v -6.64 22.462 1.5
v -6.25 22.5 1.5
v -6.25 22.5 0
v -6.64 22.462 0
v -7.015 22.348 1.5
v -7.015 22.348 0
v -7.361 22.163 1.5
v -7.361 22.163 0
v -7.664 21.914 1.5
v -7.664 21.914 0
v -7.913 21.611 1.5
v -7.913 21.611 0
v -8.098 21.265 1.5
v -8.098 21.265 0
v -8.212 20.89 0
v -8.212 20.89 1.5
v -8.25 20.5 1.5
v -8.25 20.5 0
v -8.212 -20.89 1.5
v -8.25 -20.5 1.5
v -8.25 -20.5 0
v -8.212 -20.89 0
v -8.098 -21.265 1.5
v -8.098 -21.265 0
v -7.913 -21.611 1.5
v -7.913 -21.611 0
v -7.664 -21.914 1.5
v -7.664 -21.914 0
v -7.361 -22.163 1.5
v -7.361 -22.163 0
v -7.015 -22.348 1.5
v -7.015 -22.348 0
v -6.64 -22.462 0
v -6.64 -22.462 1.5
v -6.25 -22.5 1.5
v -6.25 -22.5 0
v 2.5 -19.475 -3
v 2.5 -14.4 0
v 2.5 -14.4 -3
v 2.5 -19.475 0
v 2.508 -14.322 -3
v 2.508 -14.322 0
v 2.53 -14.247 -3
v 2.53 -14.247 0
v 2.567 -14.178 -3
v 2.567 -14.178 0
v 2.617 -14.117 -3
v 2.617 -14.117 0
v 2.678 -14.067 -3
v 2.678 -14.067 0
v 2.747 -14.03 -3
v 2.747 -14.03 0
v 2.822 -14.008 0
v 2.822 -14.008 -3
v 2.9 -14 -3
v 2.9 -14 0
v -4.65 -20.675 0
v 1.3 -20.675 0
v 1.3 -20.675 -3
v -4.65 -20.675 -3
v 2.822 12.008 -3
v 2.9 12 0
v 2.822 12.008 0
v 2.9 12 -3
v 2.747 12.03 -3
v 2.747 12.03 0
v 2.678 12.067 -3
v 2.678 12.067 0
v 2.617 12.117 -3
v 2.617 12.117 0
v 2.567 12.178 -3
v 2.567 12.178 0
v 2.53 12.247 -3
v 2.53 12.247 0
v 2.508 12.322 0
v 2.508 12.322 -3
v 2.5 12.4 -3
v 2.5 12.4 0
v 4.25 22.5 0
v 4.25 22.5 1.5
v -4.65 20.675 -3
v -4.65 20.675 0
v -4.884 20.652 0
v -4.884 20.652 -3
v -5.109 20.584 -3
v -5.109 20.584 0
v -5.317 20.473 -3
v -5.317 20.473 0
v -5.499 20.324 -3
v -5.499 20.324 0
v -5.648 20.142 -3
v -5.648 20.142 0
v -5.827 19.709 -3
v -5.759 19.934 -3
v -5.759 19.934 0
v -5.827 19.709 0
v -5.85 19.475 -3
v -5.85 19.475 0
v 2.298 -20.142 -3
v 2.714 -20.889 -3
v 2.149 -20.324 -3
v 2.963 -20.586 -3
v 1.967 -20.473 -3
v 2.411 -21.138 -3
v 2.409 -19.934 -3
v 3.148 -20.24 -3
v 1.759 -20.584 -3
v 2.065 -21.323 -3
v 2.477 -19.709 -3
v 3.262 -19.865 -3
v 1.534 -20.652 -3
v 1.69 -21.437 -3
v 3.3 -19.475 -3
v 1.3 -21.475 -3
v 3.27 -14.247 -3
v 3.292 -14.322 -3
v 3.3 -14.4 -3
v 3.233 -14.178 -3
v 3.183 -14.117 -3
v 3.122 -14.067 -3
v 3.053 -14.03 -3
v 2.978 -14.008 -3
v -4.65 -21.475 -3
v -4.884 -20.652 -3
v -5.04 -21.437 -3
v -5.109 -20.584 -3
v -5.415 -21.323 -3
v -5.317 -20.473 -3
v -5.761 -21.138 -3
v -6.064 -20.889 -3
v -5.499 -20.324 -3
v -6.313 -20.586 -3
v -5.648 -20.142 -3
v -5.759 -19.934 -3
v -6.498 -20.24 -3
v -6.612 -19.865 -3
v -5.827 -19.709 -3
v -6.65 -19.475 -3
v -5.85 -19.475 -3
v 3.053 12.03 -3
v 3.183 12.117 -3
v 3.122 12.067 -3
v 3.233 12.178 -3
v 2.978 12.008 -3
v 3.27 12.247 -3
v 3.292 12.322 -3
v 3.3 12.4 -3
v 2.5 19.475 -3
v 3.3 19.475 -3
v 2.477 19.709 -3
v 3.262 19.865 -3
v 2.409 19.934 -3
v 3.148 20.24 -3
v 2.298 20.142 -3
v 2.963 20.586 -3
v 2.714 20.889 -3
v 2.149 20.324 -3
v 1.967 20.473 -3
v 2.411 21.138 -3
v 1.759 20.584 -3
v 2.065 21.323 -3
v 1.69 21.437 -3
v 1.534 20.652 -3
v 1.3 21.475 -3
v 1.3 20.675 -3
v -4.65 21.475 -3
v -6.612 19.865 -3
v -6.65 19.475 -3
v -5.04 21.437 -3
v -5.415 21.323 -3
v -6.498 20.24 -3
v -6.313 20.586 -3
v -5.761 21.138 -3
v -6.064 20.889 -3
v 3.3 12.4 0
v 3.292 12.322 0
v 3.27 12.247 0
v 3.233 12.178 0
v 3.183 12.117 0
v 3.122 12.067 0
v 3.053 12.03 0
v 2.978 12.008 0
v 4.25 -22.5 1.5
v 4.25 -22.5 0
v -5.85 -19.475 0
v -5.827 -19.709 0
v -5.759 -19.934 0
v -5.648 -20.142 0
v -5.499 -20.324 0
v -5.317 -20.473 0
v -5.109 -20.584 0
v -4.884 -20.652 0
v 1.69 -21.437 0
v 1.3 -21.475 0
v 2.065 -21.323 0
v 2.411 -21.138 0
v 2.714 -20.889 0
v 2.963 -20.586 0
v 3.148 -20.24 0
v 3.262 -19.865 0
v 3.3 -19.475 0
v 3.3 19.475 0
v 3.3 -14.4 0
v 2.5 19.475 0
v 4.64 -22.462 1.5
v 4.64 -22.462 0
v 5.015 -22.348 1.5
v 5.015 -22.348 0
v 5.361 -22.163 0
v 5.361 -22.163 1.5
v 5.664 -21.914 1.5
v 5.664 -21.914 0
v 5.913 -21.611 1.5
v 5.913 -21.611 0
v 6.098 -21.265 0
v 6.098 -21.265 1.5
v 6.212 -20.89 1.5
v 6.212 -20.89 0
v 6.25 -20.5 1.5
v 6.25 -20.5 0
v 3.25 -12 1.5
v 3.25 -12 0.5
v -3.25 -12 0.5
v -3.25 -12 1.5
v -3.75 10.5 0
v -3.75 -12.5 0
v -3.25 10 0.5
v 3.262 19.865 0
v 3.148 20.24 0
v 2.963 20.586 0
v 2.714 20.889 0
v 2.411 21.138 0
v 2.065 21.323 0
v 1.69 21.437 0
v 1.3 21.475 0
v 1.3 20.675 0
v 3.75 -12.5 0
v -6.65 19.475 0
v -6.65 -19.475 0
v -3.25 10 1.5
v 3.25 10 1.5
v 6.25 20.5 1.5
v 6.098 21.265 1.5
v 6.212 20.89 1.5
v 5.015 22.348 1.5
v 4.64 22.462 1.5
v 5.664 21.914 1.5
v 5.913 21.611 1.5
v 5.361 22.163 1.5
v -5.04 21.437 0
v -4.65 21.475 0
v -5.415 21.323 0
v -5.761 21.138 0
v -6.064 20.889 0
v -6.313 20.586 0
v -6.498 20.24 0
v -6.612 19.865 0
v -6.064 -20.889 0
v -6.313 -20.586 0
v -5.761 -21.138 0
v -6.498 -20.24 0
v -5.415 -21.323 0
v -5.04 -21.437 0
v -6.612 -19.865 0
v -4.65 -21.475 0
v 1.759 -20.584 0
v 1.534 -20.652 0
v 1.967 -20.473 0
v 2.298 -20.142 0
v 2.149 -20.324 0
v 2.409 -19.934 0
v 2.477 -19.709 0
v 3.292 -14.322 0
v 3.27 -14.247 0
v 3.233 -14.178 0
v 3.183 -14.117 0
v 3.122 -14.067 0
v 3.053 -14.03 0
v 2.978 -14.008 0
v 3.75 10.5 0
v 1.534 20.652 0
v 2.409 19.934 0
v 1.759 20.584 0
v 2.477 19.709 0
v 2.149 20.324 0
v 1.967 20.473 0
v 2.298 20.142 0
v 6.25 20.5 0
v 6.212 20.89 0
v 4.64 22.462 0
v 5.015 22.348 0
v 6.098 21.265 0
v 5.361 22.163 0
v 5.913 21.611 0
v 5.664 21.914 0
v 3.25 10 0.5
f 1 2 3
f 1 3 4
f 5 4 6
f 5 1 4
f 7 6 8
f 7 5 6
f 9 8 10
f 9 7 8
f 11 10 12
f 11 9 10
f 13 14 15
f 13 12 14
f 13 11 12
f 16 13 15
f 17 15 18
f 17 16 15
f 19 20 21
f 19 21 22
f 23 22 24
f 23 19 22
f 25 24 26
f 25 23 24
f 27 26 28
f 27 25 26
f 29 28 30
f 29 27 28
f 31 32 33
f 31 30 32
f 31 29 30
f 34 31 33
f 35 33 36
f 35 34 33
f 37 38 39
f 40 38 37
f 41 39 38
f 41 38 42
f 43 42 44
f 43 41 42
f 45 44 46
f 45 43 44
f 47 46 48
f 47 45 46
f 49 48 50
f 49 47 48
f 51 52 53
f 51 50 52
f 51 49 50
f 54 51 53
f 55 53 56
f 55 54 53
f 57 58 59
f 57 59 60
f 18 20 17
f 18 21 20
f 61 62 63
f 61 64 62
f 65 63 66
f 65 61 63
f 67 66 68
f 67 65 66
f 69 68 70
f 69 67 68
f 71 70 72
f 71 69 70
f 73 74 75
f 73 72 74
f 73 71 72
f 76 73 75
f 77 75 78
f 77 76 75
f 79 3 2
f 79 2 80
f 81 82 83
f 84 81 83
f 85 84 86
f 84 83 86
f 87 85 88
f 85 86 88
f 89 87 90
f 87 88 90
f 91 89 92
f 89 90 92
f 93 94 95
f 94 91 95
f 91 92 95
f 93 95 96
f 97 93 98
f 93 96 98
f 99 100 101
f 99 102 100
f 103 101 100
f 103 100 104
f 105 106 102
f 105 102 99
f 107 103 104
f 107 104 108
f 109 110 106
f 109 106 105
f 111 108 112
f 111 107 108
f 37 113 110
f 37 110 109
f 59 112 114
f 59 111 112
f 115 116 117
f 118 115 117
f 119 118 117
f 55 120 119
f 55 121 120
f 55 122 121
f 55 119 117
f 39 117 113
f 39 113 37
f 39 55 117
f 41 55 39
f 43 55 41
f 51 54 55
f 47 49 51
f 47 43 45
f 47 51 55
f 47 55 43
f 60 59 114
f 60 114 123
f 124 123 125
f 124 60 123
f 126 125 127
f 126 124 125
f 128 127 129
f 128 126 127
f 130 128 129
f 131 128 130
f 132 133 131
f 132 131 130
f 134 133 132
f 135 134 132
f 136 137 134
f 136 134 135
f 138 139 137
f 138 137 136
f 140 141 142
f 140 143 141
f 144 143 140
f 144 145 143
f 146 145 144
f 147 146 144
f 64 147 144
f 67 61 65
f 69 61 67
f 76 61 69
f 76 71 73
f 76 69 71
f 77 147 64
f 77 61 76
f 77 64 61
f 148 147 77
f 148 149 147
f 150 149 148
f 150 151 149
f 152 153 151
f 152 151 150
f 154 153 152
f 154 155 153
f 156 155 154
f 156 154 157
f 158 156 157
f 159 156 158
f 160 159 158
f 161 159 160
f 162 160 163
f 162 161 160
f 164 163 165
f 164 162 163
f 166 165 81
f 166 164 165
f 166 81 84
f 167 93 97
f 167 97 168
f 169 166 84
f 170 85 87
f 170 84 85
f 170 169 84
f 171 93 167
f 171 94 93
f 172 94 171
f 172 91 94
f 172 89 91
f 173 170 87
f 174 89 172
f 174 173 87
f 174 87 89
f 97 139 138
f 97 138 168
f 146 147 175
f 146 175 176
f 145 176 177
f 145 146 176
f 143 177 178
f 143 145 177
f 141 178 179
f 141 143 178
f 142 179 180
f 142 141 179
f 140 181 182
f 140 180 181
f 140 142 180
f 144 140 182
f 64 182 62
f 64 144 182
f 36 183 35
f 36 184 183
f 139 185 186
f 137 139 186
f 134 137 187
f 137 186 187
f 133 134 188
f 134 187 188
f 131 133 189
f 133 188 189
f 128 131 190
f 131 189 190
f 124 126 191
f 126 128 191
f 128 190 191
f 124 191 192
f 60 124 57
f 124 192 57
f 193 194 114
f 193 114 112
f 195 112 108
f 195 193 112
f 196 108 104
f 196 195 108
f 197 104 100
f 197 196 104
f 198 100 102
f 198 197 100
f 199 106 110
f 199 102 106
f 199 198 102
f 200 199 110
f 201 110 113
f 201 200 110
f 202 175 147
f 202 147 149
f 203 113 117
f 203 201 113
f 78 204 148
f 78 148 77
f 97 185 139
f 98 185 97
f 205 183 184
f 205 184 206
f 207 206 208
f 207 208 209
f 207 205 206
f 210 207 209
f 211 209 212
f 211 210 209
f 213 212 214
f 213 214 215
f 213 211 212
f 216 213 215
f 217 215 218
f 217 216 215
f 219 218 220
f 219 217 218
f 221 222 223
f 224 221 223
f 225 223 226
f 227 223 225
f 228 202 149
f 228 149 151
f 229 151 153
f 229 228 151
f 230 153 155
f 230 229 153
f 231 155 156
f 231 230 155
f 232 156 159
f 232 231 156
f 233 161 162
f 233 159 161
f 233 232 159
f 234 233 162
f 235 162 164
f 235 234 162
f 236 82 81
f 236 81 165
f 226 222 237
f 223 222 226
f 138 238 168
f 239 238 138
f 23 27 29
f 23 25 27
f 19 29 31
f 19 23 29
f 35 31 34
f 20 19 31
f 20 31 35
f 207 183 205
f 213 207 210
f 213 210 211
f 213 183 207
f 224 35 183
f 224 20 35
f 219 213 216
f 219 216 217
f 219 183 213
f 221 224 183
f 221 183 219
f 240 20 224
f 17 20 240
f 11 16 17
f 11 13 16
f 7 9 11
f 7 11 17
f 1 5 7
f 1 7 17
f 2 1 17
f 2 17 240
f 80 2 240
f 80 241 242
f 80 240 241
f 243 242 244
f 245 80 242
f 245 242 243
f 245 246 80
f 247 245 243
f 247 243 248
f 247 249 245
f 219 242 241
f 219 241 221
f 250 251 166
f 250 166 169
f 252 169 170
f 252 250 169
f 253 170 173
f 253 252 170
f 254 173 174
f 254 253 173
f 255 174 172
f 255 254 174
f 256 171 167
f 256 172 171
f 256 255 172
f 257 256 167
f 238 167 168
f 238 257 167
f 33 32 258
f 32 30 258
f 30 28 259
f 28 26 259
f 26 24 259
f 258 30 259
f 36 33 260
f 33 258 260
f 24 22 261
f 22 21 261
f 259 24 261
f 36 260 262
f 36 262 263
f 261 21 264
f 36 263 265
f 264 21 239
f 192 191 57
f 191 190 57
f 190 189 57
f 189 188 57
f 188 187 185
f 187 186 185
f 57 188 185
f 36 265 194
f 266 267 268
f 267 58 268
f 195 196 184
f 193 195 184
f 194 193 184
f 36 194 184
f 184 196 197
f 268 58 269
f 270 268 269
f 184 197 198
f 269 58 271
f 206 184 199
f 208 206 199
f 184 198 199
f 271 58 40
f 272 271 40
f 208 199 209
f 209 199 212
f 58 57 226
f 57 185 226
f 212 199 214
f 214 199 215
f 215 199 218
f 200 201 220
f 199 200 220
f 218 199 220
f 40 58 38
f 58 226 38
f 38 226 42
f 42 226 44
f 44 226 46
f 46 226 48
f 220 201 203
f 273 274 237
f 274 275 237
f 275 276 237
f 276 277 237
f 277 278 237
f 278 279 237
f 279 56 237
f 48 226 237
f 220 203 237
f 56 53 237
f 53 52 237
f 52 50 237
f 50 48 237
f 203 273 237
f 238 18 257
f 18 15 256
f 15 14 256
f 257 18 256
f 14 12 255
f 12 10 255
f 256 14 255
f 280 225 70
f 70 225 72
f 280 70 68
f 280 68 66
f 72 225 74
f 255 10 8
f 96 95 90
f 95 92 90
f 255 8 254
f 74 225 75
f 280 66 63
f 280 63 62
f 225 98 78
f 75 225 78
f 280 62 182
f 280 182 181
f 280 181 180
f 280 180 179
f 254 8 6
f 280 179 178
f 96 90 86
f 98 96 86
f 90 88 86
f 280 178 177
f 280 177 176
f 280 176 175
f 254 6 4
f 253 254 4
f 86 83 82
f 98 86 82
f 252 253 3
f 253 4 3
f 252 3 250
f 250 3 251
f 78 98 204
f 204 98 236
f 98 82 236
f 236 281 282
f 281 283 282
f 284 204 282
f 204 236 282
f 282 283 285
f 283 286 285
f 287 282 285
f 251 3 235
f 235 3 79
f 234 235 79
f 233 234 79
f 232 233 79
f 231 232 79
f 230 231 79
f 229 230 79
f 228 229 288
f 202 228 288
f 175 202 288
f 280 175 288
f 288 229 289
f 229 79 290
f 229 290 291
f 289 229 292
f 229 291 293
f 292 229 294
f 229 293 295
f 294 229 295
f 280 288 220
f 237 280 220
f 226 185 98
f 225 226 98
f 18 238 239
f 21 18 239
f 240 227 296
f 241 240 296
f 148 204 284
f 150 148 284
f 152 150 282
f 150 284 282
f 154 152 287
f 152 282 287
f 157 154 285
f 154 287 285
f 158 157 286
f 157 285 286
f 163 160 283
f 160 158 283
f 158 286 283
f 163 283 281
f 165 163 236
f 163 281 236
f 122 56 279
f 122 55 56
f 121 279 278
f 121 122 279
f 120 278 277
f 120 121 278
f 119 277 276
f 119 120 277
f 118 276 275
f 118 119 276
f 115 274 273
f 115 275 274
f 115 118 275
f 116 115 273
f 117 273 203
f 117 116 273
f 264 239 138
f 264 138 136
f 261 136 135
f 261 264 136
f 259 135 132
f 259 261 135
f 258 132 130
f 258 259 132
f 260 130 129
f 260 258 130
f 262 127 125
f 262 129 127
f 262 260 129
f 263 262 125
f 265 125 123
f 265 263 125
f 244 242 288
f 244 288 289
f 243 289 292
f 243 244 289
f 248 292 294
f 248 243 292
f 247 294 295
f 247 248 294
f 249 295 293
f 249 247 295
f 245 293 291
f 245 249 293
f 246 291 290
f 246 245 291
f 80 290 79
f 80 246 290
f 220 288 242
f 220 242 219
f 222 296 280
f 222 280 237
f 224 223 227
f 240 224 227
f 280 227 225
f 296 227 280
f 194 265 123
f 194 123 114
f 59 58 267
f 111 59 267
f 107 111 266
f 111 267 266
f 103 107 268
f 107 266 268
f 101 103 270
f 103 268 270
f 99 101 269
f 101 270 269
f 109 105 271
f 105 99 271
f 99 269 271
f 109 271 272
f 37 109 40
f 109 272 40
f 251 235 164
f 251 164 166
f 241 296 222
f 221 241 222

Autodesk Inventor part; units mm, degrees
ref_plane "YZ Plane" through (0, 0, 0) normal (1, 0, 0) x (0, 1, 0)
ref_plane "XZ Plane" through (0, 0, 0) normal (0, 1, 0) x (-1, 0, 0)
ref_plane "XY Plane" through (0, 0, 0) normal (0, 0, 1) x (1, 0, 0)
sketch "Sketch1" plane through (0, 0, 0) normal (0, 0, 1) x (1, 0, 0)
  line L0 (6.25, -22.5) -> (-8.25, -22.5)
  line L1 (-8.25, -22.5) -> (-8.25, 22.5)
  line L2 (-8.25, 22.5) -> (6.25, 22.5)
  line L3 (6.25, 22.5) -> (6.25, -22.5)
  line L4 (3.25, -12) -> (-3.25, -12)
  line L5 (-3.25, -12) -> (-3.25, 10)
  line L6 (-3.25, 10) -> (3.25, 10)
  line L7 (3.25, 10) -> (3.25, -12)
  line L8 (-11.15, 0) -> (9.15, 0) projected
  line L9 (0, -12) -> (0, 0) construction
  point P0 (6.25, 0)
  dimension "d0" = 6.5
  dimension "d3" = 45
  dimension "d10" = 3
  dimension "d11" = 5
  dimension "d25" = 10
  dimension "d26" = 12
extrude "Extrusion1" add sketch "Sketch1" along normal blind 1.5 contours L0 L1 L8 L5 L4 L7 L3 | L8 L7 L6 L5 L1 L2 L3
fillet "Fillet1" radius 2 4 edges at (6.25, 22.5, 0.75) (-8.25, 22.5, 0.75) (6.25, -22.5, 0.75) (-8.25, -22.5, 0.75)
chamfer "Chamfer1" distance 0.5 angle 45 4 edges at (3.25, -1, 0) (0, 10, 0) (-3.25, -1, 0) (0, -12, 0)
sketch "Sketch2" plane through (0, 0, 0) normal (0, 0, -1) x (-1, 0, 0)
  line L0 (4.65, -21.475) -> (-1.3, -21.475)
  line L1 (-3.3, -19.475) -> (-3.3, 19.475)
  line L2 (-1.3, 21.475) -> (4.65, 21.475)
  line L3 (6.65, 19.475) -> (6.65, -19.475)
  line L4 (3.25, 10) -> (3.25, -12) projected
  arc A0 (-3.3, -19.475) -> (-1.3, -21.475) centre (-1.3, -19.475) ccw
  arc A1 (4.65, -21.475) -> (6.65, -19.475) centre (4.65, -19.475) ccw
  arc A2 (6.65, 19.475) -> (4.65, 21.475) centre (4.65, 19.475) ccw
  arc A3 (-1.3, 21.475) -> (-3.3, 19.475) centre (-1.3, 19.475) ccw
  line L5 (-2.5, 19.475) -> (-2.5, -19.475)
  arc A4 (-2.5, -19.475) -> (-1.3, -20.675) centre (-1.3, -19.475) ccw
  line L6 (-1.3, -20.675) -> (4.65, -20.675)
  arc A5 (4.65, -20.675) -> (5.85, -19.475) centre (4.65, -19.475) ccw
  line L7 (5.85, -19.475) -> (5.85, 19.475)
  arc A6 (5.85, 19.475) -> (4.65, 20.675) centre (4.65, 19.475) ccw
  line L8 (4.65, 20.675) -> (-1.3, 20.675)
  arc A7 (-1.3, 20.675) -> (-2.5, 19.475) centre (-1.3, 19.475) ccw
  line L9 (-2.5, 12) -> (-3.3, 12)
  line L10 (-2.5, -14) -> (-3.3, -14)
  line L11 (3.25, -12) -> (-3.25, -12) projected
  line L12 (-3.25, 10) -> (3.25, 10) projected
  point P0 (0, 0)
  point P1 (-3.3, 21.475)
  point P2 (6.65, 21.475)
  dimension "d12" = 42.95
  dimension "d14" = 9.95
  dimension "d16" = 3.4
  dimension "d17" = 21.475
  dimension "d18" = 2
  dimension "d19" = 0.8
  dimension "d20" = 2
  dimension "d21" = 2
extrude "Extrusion2" add sketch "Sketch2" along normal blind 3 contours L0 A0 L1 L10 L5 A4 L6 A5 L7 A6 L8 A7 L9 A3 L2 A2 L3 A1
fillet "Fillet2" radius 0.4 4 edges at (3.3, -14, -1.5) (2.5, -14, -1.5) (3.3, 12, -1.5) (2.5, 12, -1.5)
equation "\"d17\" = 0.5 * d12"
equation "\"d21\" = d20"
properties part number "EndSwitchHousing_v02_TopPlate"
